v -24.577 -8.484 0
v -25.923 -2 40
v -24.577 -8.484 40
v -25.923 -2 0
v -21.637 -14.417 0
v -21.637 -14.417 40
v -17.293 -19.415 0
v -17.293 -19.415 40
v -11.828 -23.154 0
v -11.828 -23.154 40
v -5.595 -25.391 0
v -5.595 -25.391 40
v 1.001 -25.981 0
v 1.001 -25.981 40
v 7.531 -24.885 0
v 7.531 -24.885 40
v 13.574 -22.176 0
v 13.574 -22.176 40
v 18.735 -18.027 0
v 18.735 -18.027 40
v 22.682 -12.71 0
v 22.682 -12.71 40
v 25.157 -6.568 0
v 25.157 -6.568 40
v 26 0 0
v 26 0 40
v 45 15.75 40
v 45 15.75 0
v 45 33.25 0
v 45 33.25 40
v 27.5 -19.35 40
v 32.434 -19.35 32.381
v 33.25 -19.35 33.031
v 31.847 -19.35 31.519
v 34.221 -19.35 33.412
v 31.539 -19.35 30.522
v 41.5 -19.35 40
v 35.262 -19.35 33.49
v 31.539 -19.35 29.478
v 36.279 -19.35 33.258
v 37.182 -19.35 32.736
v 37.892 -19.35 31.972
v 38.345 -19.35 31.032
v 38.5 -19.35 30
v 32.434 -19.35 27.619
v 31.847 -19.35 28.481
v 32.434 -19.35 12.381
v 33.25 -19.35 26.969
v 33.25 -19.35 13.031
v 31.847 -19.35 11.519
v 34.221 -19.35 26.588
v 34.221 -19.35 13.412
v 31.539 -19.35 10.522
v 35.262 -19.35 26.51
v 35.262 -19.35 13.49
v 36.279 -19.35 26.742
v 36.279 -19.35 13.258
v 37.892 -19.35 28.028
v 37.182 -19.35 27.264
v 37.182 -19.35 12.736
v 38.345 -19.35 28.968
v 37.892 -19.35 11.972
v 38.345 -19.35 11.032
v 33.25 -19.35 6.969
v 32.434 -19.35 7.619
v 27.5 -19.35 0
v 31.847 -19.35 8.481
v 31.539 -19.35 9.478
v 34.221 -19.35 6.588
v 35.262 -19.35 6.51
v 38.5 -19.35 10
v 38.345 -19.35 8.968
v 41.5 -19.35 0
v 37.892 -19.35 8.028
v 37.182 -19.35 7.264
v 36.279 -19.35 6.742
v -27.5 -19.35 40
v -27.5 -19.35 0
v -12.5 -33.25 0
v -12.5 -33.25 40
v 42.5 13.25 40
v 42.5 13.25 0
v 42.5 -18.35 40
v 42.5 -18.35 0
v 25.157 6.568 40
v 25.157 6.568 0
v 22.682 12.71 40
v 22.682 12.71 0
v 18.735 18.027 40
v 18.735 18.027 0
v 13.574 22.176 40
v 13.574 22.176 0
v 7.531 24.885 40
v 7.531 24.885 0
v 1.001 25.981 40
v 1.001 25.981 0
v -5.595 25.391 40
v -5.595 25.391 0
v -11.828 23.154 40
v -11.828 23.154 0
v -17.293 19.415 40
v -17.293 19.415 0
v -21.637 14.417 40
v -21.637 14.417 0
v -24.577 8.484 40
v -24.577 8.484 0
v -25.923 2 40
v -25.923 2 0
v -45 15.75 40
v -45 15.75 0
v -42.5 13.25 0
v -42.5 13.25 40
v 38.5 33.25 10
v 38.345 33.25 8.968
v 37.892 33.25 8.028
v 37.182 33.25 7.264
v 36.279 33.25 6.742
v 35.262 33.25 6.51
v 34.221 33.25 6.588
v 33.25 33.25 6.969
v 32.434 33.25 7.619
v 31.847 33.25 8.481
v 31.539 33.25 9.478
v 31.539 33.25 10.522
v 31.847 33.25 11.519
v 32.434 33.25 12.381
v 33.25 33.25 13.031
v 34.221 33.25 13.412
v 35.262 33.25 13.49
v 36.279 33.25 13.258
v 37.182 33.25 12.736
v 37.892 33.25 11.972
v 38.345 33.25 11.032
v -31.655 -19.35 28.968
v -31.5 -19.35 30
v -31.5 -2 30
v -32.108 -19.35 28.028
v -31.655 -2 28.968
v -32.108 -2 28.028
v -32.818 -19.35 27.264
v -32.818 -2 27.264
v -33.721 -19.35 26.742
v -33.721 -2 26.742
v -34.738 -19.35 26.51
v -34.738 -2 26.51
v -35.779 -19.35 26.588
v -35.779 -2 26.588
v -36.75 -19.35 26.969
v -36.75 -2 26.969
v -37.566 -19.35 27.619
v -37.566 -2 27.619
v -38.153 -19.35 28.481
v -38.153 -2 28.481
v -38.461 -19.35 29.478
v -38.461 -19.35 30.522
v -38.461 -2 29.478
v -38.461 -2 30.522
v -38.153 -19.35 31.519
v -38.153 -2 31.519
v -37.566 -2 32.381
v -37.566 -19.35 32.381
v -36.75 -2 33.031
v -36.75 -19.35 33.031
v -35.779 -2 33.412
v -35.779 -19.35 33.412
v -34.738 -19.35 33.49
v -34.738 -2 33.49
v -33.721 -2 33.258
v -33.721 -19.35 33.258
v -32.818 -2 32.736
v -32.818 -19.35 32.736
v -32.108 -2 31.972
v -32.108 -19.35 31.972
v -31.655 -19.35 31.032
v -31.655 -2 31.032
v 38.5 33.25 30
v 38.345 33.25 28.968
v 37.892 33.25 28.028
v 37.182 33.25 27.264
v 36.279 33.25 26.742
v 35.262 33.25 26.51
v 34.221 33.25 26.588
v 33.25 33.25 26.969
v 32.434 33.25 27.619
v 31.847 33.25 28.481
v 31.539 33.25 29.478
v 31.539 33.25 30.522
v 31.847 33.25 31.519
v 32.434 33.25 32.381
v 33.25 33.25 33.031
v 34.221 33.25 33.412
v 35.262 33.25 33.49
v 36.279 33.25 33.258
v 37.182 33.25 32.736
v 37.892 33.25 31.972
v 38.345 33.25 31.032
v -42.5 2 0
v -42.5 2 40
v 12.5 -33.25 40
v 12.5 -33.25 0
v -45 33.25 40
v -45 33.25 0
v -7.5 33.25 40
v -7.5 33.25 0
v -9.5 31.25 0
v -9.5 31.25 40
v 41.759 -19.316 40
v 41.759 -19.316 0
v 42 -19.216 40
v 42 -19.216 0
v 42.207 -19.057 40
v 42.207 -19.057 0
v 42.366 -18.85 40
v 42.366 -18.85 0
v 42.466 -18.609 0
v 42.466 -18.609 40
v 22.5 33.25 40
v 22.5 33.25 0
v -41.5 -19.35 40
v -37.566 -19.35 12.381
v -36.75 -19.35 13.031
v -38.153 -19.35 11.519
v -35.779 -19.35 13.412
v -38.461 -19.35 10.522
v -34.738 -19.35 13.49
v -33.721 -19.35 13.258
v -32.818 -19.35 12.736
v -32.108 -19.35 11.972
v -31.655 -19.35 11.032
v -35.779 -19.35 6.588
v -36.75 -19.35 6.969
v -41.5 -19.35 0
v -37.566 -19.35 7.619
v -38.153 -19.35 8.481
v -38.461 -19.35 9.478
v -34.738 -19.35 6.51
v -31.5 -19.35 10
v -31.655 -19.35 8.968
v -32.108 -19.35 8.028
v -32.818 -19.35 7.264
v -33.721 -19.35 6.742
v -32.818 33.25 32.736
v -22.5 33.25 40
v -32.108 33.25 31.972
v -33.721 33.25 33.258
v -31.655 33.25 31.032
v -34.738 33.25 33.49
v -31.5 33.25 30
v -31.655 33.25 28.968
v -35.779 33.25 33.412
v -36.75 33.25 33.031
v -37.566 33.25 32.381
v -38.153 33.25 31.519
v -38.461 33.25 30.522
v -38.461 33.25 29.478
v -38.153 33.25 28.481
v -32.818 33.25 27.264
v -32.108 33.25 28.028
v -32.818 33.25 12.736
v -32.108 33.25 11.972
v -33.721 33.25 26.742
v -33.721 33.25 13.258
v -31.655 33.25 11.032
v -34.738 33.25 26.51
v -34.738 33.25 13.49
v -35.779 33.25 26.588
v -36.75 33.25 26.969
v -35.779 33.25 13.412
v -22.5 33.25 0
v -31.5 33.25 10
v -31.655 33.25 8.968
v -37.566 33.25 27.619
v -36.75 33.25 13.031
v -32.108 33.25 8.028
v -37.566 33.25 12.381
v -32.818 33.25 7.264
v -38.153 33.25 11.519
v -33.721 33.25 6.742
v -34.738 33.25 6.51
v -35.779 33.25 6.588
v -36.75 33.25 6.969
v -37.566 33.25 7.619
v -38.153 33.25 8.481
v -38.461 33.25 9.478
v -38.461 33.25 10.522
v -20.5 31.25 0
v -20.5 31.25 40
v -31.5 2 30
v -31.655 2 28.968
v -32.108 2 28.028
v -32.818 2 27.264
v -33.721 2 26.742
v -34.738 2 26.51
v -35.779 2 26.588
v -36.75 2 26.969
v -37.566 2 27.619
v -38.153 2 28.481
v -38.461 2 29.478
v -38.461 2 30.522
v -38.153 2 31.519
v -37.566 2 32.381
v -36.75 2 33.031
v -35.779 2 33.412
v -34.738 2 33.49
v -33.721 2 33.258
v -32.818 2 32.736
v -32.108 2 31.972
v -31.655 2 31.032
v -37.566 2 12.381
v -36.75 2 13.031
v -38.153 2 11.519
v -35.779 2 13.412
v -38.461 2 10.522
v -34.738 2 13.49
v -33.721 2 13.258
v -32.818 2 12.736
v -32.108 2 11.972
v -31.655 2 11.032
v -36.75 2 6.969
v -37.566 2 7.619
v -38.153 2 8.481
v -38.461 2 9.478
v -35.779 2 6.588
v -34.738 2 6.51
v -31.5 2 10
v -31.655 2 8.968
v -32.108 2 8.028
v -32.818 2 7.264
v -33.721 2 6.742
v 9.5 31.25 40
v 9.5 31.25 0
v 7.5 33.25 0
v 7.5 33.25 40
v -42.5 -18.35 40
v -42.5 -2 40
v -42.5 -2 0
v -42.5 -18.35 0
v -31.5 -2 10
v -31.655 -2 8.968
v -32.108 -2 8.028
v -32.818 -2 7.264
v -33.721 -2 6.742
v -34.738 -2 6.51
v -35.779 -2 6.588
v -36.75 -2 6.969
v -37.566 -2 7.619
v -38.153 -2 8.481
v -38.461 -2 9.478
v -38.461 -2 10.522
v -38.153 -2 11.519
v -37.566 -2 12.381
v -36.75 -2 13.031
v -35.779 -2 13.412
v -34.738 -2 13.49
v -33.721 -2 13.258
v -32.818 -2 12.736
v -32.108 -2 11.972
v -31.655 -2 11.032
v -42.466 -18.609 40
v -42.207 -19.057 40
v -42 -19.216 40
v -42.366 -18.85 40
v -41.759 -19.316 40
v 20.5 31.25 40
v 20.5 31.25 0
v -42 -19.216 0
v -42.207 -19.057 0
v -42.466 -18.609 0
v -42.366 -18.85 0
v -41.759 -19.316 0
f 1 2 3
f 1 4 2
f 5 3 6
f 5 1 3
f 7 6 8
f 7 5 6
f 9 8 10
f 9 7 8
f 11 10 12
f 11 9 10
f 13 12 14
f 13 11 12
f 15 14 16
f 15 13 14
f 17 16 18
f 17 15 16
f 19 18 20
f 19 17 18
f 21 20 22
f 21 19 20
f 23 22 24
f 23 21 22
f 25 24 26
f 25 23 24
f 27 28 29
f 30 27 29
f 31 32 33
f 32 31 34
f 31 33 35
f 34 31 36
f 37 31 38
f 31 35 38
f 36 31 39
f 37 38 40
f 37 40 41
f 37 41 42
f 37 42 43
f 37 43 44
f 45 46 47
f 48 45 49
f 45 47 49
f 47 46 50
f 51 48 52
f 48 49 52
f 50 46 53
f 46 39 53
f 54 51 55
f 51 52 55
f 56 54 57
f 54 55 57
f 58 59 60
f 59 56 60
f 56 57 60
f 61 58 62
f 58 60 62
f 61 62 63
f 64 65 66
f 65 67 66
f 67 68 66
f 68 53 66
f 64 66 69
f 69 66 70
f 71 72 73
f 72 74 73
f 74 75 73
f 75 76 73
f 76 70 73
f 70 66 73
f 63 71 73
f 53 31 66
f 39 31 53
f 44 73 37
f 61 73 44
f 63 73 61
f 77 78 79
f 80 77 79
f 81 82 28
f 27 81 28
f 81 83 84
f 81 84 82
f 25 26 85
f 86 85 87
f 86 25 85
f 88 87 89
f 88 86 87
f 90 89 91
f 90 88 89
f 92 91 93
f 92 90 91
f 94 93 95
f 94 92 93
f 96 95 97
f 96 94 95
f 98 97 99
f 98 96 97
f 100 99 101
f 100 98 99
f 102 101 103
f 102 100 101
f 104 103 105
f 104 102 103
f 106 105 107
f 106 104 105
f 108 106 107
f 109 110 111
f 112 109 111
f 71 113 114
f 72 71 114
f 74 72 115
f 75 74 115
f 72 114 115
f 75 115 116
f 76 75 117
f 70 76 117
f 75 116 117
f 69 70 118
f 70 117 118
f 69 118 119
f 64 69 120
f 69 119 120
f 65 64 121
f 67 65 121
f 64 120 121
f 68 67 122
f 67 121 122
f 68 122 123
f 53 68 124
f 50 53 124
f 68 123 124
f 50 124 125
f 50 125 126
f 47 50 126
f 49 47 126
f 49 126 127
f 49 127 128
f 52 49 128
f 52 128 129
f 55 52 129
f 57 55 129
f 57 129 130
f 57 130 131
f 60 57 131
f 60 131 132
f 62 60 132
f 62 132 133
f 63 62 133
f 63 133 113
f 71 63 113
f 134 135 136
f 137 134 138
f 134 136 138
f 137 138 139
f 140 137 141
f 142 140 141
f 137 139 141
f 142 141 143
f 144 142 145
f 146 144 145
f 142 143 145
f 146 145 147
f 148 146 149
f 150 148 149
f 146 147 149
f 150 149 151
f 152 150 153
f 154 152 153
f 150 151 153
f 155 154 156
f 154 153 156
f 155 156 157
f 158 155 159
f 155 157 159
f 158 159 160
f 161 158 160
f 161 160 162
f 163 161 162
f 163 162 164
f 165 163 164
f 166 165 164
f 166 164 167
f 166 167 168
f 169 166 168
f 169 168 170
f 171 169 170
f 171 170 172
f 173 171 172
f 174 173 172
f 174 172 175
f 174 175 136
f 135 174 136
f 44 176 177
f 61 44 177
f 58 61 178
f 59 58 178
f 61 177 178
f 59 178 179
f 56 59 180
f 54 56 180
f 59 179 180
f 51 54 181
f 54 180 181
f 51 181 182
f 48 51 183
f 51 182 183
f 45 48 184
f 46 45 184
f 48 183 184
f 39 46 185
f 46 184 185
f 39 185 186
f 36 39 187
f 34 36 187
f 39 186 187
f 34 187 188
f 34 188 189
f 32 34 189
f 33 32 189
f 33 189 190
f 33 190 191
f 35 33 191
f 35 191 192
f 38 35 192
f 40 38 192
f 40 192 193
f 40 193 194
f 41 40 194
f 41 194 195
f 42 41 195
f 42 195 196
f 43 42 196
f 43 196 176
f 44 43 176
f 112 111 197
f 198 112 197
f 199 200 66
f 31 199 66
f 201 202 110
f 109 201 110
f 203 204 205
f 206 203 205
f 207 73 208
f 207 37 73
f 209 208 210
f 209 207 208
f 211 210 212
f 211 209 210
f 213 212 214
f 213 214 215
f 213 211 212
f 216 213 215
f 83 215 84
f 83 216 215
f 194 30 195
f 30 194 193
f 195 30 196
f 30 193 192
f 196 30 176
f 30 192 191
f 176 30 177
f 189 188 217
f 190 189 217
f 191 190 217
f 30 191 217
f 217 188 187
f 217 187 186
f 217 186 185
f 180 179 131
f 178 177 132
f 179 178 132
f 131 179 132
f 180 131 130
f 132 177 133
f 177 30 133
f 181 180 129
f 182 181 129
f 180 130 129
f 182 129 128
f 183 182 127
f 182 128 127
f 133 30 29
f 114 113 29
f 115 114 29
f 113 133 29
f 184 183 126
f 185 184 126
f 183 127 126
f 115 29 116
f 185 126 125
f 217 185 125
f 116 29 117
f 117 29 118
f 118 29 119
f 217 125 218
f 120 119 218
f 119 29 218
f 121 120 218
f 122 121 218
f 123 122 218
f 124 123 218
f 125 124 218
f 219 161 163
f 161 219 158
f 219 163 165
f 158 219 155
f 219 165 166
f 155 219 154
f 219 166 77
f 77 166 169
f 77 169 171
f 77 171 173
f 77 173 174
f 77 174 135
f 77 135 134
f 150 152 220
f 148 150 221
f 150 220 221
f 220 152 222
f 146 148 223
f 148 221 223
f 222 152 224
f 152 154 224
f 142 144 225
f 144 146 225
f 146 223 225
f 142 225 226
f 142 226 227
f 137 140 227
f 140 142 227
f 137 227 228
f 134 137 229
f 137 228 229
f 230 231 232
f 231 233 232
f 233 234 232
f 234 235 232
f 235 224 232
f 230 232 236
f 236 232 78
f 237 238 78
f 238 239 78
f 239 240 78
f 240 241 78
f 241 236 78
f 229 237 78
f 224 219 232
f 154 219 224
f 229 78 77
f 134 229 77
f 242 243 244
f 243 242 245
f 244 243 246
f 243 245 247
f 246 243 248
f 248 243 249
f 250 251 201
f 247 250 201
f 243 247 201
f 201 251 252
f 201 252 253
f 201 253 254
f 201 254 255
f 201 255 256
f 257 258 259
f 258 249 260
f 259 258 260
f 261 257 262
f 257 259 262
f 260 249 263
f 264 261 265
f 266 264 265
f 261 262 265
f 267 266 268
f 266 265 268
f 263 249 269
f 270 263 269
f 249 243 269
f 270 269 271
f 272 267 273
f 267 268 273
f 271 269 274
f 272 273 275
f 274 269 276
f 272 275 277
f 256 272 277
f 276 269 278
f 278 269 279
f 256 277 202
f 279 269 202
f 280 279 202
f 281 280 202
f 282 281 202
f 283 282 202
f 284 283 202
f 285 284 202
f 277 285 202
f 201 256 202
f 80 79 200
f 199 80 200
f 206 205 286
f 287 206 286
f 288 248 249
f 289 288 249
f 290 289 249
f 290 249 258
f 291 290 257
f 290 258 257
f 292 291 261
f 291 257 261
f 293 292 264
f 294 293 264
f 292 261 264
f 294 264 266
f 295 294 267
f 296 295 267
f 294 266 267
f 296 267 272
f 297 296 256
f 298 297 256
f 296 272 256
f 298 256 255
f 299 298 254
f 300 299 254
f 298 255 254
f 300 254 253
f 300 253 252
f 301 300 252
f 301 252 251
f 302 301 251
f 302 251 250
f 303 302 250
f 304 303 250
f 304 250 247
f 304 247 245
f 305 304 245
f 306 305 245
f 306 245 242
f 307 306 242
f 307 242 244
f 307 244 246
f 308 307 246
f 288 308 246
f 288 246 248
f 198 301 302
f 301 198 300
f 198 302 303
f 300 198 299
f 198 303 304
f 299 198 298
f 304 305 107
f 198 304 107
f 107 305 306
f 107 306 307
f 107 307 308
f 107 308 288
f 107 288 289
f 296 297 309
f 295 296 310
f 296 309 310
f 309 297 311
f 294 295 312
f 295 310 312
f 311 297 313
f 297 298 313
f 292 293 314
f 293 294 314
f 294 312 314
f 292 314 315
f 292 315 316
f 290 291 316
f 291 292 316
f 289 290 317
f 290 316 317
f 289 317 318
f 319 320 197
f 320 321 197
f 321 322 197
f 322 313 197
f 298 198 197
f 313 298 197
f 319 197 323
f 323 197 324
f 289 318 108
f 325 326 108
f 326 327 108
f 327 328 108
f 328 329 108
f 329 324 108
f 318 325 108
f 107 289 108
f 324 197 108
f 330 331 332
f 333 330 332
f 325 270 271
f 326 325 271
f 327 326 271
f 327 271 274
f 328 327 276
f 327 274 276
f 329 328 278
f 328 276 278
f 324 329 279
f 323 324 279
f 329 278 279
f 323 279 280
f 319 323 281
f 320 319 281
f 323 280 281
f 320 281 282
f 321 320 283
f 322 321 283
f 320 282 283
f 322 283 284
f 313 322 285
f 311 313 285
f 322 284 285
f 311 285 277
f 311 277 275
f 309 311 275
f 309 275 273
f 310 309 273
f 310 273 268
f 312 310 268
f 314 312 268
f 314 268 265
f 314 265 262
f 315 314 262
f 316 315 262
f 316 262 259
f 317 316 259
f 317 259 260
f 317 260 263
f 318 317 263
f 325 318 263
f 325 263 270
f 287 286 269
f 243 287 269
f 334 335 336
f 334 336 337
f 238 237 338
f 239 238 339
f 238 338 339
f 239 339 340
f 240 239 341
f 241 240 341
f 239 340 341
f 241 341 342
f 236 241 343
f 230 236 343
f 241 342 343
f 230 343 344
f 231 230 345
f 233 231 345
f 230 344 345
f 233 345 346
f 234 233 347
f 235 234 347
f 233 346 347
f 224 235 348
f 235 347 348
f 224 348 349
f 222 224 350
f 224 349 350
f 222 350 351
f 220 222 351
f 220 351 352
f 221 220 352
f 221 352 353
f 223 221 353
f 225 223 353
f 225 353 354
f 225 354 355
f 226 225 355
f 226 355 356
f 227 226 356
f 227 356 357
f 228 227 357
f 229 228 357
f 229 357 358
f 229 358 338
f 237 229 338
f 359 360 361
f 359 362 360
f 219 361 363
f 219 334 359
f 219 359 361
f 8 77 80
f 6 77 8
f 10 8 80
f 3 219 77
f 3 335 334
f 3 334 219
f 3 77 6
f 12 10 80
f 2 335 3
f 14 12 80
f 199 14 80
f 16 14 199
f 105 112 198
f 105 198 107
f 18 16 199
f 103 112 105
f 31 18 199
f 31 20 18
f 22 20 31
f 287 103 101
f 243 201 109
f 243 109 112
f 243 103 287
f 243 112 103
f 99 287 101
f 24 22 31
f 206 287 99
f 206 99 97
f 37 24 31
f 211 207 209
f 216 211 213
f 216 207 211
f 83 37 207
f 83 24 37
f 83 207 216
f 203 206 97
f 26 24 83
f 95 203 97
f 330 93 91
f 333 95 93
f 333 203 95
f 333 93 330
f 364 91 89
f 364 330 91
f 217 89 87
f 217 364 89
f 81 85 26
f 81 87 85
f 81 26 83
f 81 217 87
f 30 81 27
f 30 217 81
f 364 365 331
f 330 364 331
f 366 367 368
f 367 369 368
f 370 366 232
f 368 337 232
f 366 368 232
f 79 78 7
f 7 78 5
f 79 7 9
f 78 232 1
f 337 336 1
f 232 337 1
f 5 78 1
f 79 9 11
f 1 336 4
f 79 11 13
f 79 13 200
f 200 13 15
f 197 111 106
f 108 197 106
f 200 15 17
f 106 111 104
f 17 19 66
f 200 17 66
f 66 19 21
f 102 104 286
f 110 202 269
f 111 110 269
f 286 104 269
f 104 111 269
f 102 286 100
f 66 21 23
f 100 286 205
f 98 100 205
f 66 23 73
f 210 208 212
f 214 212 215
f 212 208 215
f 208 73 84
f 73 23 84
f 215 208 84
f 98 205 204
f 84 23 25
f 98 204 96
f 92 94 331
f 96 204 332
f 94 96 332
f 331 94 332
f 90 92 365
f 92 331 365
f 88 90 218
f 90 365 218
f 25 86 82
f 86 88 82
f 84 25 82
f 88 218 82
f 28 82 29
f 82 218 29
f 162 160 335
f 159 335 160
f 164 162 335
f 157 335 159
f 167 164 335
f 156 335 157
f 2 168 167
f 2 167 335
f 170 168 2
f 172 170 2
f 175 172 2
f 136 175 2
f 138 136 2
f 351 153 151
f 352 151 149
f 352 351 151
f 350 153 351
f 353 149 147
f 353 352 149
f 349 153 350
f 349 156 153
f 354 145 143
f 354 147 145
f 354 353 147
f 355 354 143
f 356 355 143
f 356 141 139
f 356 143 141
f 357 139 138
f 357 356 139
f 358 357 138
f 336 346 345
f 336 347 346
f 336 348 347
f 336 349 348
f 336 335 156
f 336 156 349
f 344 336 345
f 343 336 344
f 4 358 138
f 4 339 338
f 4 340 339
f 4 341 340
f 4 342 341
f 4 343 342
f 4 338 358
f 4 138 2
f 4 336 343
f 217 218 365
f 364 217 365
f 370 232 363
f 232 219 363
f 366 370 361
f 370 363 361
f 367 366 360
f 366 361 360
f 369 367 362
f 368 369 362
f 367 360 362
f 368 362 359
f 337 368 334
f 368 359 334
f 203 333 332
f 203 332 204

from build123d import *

# Parameters (mm, degrees)
SKETCH_1_R          = 26
EXTRUDE_1_DEPTH     = 40
SKETCH_2_R          = 3.5
CUT_EXTRUDE_1_DEPTH = 67.5
SKETCH_3_W          = 33.659947674
SKETCH_3_H          = 4
CUT_EXTRUDE_3_DEPTH = 41
FILLET_1_R          = 1


with BuildPart() as part:
    # 草图1 → 凸台-拉伸1 (new body)
    with BuildSketch(Plane.XY):
        Polygon((-12.5, -33.25), (12.5, -33.25), (27.5, -19.35), (42.5, -19.35), (42.5, 13.25), (45, 15.75), (45, 33.25), (22.5, 33.25), (20.5, 31.25), (9.5, 31.25), (7.5, 33.25), (-7.5, 33.25), (-9.5, 31.25), (-20.5, 31.25), (-22.5, 33.25), (-45, 33.25), (-45, 15.75), (-42.5, 13.25), (-42.5, -19.35), (-27.5, -19.35), align=None)
        Circle(SKETCH_1_R, mode=Mode.SUBTRACT)
    extrude(amount=EXTRUDE_1_DEPTH)

    # 草图2 → 切除-拉伸1 (cut, through all)
    with BuildSketch(Plane(origin=(0, 33.25, 0), x_dir=(1, 0, 0), z_dir=(0, 1, 0))):
        with Locations((-35, -10)):
            Circle(SKETCH_2_R)
        with Locations((-35, -30)):
            Circle(SKETCH_2_R)
        with Locations((35, -30)):
            Circle(SKETCH_2_R)
        with Locations((35, -10)):
            Circle(SKETCH_2_R)
    extrude(amount=-CUT_EXTRUDE_1_DEPTH, mode=Mode.SUBTRACT)

    # 草图3 → 切除-拉伸3 (cut, through all)
    with BuildSketch(Plane.XY):
        with Locations((-31.784741675, 0)):
            Rectangle(SKETCH_3_W, SKETCH_3_H)
    extrude(amount=CUT_EXTRUDE_3_DEPTH, mode=Mode.SUBTRACT)

    # 圆角1
    fillet_1_edges = [part.edges().sort_by_distance(p)[0] for p in [
        (42.5, -19.35, 20),
        (-42.5, -19.35, 20),
    ]]
    fillet(fillet_1_edges, radius=FILLET_1_R)


solid = part.part
